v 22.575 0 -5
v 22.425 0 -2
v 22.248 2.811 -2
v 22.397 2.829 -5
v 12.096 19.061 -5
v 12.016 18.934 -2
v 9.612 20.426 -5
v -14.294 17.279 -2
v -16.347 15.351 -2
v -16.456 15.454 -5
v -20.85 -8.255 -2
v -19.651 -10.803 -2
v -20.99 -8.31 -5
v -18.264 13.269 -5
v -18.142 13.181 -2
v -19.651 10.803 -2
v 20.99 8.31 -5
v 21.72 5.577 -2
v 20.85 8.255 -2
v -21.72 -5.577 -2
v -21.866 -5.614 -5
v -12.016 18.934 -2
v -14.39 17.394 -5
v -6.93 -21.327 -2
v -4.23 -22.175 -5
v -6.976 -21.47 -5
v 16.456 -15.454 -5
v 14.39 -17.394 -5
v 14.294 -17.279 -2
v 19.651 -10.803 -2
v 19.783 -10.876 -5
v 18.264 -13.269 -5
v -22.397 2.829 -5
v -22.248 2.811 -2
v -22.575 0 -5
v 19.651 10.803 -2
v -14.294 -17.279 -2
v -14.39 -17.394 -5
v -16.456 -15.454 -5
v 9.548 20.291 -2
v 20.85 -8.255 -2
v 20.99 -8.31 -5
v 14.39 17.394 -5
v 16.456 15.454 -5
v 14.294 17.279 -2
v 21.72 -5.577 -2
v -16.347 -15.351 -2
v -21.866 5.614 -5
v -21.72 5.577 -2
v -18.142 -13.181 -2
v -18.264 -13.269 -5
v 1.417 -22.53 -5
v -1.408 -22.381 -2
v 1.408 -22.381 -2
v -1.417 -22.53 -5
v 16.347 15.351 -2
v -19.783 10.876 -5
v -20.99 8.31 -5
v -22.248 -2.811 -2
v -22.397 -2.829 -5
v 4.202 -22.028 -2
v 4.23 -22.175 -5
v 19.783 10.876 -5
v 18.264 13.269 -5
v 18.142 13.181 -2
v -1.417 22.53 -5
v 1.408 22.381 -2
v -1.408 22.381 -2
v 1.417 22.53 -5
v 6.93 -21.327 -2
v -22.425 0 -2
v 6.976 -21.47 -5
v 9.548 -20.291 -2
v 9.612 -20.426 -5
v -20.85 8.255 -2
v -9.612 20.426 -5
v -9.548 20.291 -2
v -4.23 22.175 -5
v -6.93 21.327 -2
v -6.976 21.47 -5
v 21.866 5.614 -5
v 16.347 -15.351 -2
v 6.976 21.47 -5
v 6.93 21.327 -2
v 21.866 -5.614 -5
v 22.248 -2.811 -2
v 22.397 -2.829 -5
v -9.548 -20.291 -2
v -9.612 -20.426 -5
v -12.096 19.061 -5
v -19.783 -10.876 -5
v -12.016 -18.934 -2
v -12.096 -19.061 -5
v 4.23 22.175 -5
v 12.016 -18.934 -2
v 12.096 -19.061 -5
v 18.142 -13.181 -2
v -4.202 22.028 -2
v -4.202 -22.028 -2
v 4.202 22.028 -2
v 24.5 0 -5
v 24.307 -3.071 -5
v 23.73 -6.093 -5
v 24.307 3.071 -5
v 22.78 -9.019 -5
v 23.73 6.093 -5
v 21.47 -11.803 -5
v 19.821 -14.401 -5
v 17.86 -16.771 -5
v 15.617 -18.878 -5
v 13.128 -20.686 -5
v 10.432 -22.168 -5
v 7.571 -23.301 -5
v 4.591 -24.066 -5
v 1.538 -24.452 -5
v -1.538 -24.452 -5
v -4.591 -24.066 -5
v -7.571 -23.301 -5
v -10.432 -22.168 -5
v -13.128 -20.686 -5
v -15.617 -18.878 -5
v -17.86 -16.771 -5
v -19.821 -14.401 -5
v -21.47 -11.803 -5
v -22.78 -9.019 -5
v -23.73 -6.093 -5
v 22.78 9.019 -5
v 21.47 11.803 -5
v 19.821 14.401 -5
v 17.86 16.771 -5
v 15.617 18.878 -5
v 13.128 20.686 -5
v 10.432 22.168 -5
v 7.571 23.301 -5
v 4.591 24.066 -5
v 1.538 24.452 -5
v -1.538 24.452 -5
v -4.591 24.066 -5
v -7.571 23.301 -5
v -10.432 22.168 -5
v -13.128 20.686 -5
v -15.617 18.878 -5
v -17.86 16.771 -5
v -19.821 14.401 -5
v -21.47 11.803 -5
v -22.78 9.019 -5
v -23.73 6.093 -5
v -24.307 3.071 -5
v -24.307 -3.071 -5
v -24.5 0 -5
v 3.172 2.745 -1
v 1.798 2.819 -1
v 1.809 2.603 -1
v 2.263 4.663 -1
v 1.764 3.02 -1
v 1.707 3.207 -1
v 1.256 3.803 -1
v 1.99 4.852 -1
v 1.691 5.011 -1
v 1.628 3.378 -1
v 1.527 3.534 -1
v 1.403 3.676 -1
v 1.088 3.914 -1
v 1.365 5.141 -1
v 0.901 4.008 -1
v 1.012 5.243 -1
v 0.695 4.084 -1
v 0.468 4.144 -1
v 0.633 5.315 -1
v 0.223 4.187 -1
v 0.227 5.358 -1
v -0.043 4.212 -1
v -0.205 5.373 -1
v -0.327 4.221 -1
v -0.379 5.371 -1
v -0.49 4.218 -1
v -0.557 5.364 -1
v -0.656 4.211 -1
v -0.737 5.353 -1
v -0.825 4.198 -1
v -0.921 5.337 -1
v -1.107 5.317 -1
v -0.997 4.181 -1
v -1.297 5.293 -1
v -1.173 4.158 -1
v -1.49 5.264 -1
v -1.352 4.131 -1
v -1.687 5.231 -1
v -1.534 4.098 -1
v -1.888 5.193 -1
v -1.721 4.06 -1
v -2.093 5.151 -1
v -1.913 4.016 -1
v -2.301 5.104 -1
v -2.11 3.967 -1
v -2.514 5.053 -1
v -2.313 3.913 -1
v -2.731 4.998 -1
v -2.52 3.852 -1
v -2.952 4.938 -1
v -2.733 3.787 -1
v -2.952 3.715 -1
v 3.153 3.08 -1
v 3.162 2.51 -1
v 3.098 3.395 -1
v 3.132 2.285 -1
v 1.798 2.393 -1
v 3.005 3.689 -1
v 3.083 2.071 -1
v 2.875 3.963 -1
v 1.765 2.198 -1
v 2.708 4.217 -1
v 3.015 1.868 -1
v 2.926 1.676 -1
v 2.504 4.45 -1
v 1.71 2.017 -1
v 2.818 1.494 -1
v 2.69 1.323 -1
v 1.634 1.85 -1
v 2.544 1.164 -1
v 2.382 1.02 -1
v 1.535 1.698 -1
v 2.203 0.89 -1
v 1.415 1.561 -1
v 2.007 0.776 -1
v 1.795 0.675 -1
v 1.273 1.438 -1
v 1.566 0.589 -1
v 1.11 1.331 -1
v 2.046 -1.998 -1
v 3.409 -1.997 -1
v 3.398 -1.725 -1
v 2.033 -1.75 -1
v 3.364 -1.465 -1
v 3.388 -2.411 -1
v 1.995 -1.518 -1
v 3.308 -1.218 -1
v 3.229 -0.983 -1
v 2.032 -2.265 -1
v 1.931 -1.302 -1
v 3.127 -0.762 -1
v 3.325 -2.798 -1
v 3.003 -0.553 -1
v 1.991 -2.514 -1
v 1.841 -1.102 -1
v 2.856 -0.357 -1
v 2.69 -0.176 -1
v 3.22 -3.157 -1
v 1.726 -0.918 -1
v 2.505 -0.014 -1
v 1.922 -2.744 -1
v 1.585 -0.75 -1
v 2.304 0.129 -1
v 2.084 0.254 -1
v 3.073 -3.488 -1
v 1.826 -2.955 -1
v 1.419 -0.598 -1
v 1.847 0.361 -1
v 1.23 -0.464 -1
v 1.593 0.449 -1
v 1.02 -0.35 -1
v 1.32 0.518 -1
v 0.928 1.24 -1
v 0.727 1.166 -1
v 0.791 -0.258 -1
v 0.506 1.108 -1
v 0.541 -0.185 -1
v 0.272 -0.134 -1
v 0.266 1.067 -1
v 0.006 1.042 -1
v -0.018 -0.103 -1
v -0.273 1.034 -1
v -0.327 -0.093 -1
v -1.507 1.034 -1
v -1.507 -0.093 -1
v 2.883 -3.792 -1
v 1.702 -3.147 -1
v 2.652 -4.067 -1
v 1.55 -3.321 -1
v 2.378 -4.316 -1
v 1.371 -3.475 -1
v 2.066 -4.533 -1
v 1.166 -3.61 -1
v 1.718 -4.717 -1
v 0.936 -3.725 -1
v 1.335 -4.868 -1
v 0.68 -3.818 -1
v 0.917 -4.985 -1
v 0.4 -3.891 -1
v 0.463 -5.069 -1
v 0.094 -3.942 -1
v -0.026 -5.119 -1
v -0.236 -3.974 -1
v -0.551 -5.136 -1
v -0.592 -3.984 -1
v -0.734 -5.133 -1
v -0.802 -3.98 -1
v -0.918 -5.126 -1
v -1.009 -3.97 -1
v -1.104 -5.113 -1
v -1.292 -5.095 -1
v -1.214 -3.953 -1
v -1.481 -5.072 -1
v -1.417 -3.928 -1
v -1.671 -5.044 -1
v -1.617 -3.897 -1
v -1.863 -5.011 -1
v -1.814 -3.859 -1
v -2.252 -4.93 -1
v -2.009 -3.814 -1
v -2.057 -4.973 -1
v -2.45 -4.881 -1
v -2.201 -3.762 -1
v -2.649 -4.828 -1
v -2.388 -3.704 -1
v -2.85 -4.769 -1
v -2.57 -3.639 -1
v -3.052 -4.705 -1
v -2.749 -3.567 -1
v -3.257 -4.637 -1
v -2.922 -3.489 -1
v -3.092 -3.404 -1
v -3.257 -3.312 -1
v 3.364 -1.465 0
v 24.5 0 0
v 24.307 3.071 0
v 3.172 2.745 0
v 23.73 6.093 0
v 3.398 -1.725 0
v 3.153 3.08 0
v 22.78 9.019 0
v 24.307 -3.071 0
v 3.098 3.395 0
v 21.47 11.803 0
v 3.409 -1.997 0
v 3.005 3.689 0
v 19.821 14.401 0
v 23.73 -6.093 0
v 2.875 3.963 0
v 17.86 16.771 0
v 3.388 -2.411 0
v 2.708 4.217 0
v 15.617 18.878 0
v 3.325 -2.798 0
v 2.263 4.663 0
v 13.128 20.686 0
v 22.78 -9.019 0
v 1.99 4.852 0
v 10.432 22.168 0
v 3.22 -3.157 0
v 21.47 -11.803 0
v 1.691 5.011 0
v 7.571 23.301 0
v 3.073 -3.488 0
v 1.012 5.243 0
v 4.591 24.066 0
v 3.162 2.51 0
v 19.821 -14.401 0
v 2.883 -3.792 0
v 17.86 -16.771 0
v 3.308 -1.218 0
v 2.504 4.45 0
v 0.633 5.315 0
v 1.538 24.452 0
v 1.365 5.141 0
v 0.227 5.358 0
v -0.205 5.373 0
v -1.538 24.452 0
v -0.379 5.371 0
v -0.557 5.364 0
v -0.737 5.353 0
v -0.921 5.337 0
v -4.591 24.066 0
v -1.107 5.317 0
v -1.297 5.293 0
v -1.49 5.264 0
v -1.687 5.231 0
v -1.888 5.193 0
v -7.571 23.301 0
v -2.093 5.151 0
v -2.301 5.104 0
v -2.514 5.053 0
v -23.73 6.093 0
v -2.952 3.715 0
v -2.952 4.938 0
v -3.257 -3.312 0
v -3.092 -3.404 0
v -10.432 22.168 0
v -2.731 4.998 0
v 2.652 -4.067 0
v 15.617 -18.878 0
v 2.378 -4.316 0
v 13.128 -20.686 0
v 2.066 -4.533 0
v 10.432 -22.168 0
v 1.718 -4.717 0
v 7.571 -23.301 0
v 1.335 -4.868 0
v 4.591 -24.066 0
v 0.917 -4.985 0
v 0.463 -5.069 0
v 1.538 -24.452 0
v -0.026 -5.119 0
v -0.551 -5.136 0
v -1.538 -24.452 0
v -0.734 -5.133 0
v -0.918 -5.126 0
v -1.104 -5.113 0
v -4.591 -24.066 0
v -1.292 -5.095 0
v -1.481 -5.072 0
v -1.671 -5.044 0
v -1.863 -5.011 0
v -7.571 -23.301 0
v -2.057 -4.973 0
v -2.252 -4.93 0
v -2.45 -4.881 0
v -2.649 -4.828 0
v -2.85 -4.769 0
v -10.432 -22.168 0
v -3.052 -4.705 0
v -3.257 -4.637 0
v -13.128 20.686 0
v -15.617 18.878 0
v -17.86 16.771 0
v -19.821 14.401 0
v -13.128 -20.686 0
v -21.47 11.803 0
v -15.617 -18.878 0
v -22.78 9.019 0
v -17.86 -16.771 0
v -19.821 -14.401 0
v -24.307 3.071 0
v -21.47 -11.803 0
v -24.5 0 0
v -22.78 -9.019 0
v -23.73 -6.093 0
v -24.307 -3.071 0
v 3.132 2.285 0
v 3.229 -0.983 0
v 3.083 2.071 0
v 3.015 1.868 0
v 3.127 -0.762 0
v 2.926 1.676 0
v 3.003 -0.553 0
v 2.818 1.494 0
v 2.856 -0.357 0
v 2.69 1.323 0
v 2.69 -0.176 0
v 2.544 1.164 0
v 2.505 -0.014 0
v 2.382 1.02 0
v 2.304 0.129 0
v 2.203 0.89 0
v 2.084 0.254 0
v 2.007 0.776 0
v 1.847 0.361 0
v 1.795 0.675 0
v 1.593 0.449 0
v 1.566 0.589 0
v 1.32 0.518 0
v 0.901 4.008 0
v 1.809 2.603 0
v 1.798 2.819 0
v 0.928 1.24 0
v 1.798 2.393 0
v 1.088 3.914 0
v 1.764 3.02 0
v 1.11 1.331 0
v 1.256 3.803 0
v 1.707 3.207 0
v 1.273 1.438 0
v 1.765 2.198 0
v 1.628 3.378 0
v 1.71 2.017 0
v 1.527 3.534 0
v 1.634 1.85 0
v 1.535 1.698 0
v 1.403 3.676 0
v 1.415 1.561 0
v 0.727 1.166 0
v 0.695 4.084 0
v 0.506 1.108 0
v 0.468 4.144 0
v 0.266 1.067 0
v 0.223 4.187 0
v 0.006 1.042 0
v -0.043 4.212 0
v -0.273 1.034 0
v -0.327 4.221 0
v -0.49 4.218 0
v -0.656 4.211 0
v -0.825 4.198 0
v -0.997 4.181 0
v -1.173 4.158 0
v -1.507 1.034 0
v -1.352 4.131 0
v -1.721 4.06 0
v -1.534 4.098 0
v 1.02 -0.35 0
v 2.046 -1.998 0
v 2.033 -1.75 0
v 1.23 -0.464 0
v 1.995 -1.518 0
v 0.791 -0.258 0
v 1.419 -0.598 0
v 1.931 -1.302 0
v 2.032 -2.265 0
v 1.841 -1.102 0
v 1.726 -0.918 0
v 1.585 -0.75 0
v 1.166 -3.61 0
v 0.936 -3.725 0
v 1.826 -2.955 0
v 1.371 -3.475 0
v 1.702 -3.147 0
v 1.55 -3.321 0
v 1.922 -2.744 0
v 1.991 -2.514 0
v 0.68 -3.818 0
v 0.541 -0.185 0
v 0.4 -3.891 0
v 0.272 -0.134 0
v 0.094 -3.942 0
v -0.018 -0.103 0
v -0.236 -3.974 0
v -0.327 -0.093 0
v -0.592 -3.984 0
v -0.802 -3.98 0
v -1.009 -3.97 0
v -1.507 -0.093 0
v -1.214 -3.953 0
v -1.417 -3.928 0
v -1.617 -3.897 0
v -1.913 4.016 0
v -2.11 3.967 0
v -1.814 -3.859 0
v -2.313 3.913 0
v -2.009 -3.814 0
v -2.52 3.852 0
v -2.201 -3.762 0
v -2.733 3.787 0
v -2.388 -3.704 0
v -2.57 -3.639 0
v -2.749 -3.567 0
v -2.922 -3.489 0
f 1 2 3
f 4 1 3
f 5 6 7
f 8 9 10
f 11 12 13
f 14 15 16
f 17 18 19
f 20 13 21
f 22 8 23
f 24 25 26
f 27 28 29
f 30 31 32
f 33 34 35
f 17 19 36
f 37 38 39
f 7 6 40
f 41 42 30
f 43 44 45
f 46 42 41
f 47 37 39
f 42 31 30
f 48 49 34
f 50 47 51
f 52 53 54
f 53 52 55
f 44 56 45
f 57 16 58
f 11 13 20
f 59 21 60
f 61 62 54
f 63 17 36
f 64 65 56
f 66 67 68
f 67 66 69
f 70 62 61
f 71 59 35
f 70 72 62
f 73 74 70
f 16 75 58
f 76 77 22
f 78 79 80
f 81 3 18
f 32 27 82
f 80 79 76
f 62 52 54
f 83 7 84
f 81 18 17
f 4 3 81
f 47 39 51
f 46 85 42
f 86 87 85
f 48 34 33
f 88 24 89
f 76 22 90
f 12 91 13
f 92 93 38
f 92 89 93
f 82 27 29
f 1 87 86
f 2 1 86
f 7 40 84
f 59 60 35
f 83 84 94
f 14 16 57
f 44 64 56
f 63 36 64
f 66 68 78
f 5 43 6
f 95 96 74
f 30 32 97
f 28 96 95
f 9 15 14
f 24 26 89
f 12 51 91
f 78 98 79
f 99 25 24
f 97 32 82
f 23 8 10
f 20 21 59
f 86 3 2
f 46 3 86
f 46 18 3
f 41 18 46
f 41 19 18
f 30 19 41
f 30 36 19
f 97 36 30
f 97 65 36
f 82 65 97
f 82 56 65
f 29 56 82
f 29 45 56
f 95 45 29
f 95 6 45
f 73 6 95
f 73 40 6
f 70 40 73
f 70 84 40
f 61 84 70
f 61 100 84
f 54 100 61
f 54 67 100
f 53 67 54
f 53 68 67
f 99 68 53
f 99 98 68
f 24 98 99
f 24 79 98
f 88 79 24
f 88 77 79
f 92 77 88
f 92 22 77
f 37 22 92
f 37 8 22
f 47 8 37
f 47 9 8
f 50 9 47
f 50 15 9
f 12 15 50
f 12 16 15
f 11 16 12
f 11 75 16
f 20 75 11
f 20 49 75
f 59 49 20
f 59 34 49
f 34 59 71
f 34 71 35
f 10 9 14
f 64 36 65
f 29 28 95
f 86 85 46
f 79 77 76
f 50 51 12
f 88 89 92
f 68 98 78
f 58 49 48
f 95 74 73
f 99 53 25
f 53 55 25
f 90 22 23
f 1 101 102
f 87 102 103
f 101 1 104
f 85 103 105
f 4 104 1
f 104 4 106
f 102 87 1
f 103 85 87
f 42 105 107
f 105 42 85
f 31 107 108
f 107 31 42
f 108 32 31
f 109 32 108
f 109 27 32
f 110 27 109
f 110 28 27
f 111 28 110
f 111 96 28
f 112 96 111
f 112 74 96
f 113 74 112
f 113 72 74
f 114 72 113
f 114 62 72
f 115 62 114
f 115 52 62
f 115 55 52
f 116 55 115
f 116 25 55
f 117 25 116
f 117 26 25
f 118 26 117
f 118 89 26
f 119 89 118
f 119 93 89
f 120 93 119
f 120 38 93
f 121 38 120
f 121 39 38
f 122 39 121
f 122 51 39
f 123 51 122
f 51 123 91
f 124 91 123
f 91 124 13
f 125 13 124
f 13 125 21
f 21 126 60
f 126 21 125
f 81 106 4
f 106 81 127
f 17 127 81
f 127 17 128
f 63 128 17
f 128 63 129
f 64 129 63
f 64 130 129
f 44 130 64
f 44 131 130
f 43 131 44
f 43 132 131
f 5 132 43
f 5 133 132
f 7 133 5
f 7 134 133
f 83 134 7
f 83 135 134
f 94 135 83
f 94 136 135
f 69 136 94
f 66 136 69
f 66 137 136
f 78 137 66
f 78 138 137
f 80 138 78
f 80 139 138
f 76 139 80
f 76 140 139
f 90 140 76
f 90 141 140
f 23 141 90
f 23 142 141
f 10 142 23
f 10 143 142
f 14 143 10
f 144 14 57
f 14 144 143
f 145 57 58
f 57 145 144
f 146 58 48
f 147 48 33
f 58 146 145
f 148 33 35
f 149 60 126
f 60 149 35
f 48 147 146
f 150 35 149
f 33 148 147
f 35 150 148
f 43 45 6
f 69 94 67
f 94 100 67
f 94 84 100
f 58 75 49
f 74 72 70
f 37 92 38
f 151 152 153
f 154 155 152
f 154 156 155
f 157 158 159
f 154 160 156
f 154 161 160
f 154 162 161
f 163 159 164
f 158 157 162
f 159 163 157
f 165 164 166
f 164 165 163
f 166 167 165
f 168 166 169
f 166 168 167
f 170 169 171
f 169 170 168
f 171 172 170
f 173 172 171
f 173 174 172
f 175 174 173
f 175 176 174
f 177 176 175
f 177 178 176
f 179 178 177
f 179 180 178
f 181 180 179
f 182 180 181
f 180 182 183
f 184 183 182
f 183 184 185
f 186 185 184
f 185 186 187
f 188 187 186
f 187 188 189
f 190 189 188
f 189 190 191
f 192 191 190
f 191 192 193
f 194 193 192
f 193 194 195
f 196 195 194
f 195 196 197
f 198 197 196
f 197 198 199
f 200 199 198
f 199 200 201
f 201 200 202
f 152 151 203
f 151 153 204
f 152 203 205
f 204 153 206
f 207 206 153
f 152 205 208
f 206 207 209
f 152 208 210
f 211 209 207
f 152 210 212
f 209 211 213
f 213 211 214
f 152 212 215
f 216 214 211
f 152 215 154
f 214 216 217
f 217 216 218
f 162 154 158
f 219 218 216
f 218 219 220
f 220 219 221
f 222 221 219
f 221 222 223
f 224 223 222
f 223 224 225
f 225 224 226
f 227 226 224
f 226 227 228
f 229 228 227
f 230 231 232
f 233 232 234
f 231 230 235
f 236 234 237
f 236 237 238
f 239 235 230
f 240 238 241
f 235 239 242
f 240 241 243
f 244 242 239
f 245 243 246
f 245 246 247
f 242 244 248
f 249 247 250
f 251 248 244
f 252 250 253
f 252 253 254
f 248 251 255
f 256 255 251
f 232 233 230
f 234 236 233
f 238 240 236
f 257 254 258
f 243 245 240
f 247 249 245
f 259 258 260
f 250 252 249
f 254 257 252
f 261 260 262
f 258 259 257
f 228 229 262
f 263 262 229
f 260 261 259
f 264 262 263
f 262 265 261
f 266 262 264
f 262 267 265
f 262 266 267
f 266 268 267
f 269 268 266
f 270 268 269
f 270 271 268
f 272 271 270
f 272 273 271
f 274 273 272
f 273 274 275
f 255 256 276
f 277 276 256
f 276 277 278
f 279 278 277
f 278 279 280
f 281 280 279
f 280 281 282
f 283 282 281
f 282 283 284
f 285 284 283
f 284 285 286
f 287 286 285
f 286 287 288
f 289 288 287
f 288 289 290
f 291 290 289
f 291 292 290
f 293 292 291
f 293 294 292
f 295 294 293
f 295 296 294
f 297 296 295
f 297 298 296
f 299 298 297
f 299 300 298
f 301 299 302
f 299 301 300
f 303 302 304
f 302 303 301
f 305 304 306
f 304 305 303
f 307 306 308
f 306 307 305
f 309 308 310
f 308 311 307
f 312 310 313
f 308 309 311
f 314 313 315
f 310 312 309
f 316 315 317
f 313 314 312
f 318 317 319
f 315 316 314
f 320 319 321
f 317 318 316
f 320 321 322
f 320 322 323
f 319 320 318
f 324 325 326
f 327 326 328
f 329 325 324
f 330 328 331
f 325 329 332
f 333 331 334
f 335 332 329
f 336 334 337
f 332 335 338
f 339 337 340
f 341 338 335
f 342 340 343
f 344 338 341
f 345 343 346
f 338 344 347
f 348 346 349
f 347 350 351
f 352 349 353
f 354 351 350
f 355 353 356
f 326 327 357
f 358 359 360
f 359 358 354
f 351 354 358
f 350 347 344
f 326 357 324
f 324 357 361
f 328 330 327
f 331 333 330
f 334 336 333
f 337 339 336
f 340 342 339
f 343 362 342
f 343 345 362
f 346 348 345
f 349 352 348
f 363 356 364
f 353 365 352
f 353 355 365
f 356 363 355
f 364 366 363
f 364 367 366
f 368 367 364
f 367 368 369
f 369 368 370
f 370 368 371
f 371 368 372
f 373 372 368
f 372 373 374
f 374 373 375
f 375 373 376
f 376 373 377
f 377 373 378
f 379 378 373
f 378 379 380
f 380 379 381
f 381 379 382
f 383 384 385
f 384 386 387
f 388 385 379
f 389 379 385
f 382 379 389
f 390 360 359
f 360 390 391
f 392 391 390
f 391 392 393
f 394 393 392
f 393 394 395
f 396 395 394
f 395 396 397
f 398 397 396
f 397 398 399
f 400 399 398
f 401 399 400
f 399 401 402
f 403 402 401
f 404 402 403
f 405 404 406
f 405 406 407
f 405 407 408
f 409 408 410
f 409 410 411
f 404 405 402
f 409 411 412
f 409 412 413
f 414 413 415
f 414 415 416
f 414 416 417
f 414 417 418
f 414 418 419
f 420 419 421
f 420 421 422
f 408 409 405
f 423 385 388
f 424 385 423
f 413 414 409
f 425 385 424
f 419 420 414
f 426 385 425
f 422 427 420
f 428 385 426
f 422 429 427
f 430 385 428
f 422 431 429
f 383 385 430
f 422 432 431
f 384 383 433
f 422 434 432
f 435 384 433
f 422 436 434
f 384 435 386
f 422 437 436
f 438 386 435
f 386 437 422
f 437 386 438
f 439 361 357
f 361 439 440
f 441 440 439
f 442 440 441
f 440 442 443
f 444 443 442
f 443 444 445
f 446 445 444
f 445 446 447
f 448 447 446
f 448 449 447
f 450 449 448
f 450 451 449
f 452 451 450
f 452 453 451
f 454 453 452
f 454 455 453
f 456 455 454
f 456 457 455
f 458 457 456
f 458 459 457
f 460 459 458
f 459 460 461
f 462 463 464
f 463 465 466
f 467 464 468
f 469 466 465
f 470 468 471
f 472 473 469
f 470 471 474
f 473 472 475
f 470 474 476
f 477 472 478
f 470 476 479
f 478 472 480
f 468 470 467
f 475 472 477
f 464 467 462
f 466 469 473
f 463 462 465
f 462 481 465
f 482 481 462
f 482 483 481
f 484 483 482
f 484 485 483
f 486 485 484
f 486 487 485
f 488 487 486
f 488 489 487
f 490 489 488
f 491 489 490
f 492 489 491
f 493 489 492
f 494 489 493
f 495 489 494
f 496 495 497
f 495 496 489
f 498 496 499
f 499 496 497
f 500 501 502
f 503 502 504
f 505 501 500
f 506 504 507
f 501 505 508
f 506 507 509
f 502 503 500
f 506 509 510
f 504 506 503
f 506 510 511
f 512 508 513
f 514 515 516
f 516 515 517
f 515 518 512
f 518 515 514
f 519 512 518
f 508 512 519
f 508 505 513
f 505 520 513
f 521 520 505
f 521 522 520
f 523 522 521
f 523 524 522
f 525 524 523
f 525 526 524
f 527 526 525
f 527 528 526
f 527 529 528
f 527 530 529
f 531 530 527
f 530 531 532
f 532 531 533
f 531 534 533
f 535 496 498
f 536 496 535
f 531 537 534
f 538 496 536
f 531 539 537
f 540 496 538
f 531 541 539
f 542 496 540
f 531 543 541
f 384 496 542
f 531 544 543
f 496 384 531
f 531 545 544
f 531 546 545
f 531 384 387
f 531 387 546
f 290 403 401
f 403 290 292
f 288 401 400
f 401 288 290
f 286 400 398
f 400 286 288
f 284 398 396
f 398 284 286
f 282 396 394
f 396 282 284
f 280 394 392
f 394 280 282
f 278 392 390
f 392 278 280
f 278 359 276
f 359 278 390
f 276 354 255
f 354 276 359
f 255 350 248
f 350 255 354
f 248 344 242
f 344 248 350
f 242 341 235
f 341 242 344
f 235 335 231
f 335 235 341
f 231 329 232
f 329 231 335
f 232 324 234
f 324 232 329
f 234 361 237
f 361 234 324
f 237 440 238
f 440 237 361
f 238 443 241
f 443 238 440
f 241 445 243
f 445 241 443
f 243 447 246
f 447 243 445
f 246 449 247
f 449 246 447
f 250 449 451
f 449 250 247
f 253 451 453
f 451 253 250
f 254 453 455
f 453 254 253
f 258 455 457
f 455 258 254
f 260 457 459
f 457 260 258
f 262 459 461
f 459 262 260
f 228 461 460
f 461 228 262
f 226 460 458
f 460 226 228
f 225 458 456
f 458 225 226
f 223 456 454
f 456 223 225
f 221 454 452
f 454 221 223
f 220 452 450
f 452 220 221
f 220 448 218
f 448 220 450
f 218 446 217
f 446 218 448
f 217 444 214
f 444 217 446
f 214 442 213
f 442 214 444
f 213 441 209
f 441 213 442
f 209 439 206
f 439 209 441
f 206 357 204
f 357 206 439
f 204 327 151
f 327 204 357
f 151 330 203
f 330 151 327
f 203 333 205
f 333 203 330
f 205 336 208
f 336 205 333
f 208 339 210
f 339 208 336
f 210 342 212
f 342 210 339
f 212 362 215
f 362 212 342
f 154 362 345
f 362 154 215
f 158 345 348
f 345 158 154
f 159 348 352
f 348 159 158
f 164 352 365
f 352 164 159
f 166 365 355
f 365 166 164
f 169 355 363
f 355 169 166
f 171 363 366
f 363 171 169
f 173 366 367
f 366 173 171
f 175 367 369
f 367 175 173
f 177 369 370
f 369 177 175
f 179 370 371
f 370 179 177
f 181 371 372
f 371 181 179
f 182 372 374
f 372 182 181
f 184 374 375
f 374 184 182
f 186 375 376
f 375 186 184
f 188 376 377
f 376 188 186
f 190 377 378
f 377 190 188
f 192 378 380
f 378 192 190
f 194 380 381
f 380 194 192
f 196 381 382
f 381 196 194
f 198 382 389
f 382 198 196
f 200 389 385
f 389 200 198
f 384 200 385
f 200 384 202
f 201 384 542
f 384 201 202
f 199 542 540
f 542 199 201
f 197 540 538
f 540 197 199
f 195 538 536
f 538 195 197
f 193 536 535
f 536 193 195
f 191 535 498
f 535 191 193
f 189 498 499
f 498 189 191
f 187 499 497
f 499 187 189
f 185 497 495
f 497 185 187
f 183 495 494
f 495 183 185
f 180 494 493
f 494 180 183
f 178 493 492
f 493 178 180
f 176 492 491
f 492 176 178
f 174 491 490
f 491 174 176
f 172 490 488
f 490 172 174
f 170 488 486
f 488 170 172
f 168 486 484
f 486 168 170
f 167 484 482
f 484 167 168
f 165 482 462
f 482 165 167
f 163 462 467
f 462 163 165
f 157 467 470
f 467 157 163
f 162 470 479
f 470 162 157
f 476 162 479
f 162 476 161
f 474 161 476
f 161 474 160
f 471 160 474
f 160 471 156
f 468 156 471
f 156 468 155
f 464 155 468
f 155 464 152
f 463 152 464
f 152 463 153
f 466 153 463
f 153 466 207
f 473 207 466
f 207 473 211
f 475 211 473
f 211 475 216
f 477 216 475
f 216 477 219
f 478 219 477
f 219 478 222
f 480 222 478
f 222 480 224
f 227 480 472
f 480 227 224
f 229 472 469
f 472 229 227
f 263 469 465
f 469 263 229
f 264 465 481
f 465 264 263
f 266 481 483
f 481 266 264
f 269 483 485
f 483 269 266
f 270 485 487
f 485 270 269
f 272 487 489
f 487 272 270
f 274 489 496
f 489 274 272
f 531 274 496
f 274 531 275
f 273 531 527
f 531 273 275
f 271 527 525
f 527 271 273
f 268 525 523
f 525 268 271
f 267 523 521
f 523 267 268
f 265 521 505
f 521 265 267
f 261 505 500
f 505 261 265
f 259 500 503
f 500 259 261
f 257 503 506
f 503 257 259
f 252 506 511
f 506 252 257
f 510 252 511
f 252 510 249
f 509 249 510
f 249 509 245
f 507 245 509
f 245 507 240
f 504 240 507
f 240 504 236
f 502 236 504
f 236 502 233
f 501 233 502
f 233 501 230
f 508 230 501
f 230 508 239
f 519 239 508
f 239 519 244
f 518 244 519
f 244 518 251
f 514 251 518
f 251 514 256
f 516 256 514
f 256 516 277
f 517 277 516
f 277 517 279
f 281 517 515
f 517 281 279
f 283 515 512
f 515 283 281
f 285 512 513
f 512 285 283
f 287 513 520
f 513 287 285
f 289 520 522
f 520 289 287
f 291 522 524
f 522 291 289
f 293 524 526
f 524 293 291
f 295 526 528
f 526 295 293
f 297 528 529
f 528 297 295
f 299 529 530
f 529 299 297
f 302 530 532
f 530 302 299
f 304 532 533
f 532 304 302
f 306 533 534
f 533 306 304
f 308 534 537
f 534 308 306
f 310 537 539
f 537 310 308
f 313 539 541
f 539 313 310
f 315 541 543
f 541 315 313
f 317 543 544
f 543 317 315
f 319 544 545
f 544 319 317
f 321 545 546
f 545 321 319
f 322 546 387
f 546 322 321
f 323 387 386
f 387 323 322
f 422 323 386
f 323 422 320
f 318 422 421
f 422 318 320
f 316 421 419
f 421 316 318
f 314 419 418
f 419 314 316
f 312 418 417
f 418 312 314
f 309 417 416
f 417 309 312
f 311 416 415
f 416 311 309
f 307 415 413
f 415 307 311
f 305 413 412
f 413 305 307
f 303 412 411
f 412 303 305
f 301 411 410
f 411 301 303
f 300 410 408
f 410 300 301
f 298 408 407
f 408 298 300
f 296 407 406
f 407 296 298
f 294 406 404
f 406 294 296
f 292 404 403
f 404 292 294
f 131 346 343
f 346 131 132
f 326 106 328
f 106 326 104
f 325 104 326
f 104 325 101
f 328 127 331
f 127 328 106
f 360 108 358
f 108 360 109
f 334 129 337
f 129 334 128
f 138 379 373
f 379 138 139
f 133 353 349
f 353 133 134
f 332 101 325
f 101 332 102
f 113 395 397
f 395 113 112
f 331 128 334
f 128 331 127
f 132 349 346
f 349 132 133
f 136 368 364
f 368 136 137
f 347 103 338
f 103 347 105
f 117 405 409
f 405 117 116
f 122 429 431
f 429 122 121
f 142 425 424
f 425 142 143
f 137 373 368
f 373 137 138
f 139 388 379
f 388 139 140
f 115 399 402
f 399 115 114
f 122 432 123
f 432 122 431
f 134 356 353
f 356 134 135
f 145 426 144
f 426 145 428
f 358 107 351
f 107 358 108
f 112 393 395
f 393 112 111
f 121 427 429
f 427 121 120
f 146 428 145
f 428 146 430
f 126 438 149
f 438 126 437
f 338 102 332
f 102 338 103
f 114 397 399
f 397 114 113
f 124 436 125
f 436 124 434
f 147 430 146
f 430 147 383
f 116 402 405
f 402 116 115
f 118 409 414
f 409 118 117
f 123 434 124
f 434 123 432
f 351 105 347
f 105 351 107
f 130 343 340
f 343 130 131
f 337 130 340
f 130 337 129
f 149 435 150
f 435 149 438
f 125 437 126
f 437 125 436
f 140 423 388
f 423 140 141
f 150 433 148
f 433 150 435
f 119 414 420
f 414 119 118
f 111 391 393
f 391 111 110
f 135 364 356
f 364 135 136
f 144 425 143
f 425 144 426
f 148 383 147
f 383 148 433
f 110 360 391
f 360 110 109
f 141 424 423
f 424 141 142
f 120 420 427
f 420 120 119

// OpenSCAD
$fn = 50;


difference() {
	union() {
		translate(v = [0, 0, -5.0000000000]) {
			cylinder(h = 5, r = 24.5000000000);
		}
	}
	union() {
		#translate(v = [0, 0, -5.0000000000]) {
			cylinder(h = 3, r1 = 22.5750000000, r2 = 22.4250000000);
		}
		translate(v = [0, 0, -1]) {
			linear_extrude(height = 1) {
				text(font = "Impact", halign = "center", size = 10, text = "3", valign = "center");
			}
		}
	}
}
